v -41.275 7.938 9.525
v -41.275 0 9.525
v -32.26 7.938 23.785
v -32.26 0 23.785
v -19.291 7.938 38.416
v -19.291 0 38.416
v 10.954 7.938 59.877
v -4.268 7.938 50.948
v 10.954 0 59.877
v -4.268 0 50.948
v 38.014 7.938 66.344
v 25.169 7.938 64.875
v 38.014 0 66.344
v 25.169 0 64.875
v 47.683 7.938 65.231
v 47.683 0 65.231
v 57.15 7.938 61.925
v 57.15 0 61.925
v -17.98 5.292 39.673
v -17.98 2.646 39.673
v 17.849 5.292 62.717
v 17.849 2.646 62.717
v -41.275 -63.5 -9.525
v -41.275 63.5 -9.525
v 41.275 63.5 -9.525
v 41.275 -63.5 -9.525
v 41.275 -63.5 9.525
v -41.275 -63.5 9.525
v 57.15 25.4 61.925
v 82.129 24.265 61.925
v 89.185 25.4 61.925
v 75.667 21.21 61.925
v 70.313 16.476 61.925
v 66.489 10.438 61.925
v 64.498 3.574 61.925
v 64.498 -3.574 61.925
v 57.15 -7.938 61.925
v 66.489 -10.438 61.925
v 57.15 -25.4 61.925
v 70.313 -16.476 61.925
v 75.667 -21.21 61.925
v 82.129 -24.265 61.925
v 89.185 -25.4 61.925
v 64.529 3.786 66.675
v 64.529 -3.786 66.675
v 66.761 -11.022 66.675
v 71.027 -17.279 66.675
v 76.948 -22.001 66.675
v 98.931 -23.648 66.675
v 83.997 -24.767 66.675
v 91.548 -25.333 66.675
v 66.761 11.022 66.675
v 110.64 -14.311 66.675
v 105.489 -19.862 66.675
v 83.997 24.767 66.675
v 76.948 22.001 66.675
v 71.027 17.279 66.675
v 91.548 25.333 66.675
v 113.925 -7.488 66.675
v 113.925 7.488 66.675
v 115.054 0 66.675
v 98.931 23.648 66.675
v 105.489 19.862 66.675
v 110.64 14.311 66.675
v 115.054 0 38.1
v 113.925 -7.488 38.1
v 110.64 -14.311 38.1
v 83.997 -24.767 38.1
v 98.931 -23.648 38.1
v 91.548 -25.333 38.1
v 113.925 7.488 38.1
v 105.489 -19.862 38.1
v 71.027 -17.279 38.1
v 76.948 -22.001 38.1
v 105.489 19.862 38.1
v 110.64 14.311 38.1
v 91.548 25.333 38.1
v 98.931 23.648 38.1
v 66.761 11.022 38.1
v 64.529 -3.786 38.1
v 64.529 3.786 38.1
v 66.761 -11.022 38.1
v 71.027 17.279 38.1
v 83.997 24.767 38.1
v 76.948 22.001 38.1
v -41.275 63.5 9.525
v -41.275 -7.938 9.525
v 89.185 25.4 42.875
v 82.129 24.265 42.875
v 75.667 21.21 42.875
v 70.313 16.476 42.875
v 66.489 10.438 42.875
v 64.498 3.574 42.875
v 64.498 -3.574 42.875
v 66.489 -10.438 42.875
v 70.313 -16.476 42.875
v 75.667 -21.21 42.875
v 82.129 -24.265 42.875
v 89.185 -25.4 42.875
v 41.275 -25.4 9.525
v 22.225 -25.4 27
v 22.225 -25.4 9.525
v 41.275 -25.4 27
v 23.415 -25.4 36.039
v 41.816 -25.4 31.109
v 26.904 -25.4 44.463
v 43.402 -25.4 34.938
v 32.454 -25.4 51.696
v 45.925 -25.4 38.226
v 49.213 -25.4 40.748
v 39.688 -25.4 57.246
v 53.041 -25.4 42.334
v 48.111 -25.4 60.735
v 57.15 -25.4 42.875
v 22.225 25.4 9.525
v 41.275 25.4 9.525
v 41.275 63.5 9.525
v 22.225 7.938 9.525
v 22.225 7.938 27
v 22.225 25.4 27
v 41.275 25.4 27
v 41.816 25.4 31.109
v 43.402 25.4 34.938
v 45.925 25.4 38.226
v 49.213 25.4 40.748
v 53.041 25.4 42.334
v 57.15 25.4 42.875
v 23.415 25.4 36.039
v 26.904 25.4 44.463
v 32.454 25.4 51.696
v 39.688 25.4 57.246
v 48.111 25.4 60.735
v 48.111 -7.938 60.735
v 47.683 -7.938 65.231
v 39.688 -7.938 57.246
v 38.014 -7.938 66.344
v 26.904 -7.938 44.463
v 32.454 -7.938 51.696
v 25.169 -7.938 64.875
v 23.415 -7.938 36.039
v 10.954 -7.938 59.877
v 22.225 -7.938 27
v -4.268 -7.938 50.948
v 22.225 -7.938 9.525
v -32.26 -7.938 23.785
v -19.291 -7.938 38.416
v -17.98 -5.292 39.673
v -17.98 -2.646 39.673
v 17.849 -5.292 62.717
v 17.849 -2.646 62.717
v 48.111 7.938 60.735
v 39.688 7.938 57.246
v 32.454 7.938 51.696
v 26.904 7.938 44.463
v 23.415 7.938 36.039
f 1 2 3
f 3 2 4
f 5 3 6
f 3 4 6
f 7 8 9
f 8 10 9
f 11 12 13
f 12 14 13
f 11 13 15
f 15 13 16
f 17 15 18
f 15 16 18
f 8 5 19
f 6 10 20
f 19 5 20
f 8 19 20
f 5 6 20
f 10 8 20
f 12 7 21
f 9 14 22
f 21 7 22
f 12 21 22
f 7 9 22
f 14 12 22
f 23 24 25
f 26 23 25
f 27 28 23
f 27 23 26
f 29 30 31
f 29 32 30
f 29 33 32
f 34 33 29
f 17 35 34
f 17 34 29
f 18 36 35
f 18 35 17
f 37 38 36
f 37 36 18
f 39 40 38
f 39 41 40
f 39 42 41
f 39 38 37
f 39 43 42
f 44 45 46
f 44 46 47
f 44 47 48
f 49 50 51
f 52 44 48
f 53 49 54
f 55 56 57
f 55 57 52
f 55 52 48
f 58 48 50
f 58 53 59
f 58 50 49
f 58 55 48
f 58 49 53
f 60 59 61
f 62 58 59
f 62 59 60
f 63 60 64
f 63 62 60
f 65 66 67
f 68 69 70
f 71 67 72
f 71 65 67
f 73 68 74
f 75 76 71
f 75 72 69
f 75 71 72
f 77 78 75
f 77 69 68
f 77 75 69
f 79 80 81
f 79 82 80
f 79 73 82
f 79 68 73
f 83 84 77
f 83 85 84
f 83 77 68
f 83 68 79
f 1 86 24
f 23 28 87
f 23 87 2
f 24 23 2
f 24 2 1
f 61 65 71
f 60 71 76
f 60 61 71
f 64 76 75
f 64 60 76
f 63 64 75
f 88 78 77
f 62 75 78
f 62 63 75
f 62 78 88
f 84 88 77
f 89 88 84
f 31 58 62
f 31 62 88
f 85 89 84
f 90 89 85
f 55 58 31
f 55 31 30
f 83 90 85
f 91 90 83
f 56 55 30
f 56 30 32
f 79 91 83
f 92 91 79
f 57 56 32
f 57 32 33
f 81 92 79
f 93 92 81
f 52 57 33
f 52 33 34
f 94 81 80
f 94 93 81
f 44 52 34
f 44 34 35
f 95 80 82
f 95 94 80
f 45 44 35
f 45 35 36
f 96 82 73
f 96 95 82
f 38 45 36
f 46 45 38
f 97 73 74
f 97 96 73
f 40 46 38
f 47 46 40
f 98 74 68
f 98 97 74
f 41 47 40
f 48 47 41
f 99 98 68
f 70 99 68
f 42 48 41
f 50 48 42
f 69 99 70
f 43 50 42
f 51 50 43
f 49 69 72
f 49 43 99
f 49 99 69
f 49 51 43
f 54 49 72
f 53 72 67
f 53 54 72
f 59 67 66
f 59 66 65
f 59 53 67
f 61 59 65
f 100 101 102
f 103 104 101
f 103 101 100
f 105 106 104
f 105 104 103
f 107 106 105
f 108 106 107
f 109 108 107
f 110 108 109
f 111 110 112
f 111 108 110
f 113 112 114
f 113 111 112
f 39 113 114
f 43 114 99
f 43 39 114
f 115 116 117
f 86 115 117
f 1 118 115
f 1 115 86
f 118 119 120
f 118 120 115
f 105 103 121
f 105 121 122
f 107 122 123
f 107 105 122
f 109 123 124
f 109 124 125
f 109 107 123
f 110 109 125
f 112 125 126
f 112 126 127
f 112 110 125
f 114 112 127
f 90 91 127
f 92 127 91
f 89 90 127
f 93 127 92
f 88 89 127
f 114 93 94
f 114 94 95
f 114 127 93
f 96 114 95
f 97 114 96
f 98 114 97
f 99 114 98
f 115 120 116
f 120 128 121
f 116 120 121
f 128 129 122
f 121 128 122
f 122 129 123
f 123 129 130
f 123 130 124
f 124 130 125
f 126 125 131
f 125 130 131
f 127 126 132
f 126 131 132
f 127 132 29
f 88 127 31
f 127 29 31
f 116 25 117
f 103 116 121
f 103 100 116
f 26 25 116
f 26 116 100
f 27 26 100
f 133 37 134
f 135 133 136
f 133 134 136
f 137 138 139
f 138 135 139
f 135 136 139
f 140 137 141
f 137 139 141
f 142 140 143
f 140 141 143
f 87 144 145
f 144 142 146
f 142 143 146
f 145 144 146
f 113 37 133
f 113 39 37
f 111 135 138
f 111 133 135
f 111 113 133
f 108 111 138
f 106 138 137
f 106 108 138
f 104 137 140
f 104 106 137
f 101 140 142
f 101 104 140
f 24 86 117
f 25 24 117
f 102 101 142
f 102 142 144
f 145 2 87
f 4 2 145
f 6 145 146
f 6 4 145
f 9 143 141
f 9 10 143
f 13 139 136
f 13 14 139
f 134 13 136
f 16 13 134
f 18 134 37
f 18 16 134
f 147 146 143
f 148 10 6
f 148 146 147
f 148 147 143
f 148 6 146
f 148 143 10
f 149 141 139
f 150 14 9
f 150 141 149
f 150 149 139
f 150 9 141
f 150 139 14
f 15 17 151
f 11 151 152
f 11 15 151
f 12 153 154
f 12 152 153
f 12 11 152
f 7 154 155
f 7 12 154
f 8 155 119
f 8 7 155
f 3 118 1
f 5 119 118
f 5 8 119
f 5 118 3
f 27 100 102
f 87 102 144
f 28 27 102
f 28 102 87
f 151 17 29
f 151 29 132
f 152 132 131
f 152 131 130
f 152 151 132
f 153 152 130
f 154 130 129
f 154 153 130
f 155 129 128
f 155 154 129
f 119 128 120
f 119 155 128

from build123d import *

# Parameters (mm, degrees)
F1_DEPTH = 63.5
F0_W     = 25.3957551599
F0_H     = 19.05
F2_DEPTH = 25.4
F3_DEPTH = 7.9375


with BuildPart() as f1:
    # F0 (on Front) → F1 (new body, symmetric)
    with BuildSketch(Plane.XZ):
        Polygon((-41.275, 9.525), (-41.275, -9.525), (41.275, -9.525), (41.275, 9.525), (22.225, 9.525), align=None)
    extrude(amount=F1_DEPTH, both=True)

    # F0 (on Front) → F2 (join, symmetric)
    with BuildSketch(Plane.XZ):
        with BuildLine():
            Line((22.225, 9.525), (41.275, 9.525))
            Line((41.275, 9.525), (41.275, 27.0002))
            ThreePointArc((41.275, 27.0002), (45.9246798487, 38.2255201513), (57.15, 42.8752))
            Line((57.15, 42.8752), (64.2539668202, 42.8752))
            Line((64.2539668202, 42.8752), (64.2539668202, 61.9252))
            Line((64.2539668202, 61.9252), (57.15, 61.9252))
            ThreePointArc((57.15, 61.9252), (32.4542956671, 51.6959043329), (22.225, 27.0002))
            Line((22.225, 27.0002), (22.225, 9.525))
        make_face()
        with Locations((76.9518444002, 52.4002)):
            Rectangle(F0_W, F0_H)
    extrude(amount=F2_DEPTH, both=True)

    # F0 (on Front) → F3 (join, symmetric)
    with BuildSketch(Plane.XZ):
        with BuildLine():
            add(Edge.make_bspline(
                [(-41.275, 9.525), (-27.2662733646, 37.6478243732), (19.1320432894, 80.2122490874), (57.15, 61.9252)],
                knots=[0, 0, 0, 0, 111.5045361635, 111.5045361635, 111.5045361635, 111.5045361635], degree=3))
            Line((-41.275, 9.525), (22.225, 9.525))
            Line((22.225, 9.525), (22.225, 27.0002))
            ThreePointArc((22.225, 27.0002), (32.4542956671, 51.6959043329), (57.15, 61.9252))
        make_face()
    extrude(amount=F3_DEPTH, both=True)

    # F0 (on Front) → F4 (revolve)
    with BuildSketch(Plane.XZ):
        Polygon((89.6497219801, 66.675), (89.6497219801, 61.9252), (89.6497219801, 42.8752), (89.6497219801, 38.1), (115.0539668202, 38.1), (115.0539668202, 66.675), align=None)
    revolve(axis=Axis((89.6497219801, 0, 52.3875), (0, 0, 1)))


solid = f1.part
